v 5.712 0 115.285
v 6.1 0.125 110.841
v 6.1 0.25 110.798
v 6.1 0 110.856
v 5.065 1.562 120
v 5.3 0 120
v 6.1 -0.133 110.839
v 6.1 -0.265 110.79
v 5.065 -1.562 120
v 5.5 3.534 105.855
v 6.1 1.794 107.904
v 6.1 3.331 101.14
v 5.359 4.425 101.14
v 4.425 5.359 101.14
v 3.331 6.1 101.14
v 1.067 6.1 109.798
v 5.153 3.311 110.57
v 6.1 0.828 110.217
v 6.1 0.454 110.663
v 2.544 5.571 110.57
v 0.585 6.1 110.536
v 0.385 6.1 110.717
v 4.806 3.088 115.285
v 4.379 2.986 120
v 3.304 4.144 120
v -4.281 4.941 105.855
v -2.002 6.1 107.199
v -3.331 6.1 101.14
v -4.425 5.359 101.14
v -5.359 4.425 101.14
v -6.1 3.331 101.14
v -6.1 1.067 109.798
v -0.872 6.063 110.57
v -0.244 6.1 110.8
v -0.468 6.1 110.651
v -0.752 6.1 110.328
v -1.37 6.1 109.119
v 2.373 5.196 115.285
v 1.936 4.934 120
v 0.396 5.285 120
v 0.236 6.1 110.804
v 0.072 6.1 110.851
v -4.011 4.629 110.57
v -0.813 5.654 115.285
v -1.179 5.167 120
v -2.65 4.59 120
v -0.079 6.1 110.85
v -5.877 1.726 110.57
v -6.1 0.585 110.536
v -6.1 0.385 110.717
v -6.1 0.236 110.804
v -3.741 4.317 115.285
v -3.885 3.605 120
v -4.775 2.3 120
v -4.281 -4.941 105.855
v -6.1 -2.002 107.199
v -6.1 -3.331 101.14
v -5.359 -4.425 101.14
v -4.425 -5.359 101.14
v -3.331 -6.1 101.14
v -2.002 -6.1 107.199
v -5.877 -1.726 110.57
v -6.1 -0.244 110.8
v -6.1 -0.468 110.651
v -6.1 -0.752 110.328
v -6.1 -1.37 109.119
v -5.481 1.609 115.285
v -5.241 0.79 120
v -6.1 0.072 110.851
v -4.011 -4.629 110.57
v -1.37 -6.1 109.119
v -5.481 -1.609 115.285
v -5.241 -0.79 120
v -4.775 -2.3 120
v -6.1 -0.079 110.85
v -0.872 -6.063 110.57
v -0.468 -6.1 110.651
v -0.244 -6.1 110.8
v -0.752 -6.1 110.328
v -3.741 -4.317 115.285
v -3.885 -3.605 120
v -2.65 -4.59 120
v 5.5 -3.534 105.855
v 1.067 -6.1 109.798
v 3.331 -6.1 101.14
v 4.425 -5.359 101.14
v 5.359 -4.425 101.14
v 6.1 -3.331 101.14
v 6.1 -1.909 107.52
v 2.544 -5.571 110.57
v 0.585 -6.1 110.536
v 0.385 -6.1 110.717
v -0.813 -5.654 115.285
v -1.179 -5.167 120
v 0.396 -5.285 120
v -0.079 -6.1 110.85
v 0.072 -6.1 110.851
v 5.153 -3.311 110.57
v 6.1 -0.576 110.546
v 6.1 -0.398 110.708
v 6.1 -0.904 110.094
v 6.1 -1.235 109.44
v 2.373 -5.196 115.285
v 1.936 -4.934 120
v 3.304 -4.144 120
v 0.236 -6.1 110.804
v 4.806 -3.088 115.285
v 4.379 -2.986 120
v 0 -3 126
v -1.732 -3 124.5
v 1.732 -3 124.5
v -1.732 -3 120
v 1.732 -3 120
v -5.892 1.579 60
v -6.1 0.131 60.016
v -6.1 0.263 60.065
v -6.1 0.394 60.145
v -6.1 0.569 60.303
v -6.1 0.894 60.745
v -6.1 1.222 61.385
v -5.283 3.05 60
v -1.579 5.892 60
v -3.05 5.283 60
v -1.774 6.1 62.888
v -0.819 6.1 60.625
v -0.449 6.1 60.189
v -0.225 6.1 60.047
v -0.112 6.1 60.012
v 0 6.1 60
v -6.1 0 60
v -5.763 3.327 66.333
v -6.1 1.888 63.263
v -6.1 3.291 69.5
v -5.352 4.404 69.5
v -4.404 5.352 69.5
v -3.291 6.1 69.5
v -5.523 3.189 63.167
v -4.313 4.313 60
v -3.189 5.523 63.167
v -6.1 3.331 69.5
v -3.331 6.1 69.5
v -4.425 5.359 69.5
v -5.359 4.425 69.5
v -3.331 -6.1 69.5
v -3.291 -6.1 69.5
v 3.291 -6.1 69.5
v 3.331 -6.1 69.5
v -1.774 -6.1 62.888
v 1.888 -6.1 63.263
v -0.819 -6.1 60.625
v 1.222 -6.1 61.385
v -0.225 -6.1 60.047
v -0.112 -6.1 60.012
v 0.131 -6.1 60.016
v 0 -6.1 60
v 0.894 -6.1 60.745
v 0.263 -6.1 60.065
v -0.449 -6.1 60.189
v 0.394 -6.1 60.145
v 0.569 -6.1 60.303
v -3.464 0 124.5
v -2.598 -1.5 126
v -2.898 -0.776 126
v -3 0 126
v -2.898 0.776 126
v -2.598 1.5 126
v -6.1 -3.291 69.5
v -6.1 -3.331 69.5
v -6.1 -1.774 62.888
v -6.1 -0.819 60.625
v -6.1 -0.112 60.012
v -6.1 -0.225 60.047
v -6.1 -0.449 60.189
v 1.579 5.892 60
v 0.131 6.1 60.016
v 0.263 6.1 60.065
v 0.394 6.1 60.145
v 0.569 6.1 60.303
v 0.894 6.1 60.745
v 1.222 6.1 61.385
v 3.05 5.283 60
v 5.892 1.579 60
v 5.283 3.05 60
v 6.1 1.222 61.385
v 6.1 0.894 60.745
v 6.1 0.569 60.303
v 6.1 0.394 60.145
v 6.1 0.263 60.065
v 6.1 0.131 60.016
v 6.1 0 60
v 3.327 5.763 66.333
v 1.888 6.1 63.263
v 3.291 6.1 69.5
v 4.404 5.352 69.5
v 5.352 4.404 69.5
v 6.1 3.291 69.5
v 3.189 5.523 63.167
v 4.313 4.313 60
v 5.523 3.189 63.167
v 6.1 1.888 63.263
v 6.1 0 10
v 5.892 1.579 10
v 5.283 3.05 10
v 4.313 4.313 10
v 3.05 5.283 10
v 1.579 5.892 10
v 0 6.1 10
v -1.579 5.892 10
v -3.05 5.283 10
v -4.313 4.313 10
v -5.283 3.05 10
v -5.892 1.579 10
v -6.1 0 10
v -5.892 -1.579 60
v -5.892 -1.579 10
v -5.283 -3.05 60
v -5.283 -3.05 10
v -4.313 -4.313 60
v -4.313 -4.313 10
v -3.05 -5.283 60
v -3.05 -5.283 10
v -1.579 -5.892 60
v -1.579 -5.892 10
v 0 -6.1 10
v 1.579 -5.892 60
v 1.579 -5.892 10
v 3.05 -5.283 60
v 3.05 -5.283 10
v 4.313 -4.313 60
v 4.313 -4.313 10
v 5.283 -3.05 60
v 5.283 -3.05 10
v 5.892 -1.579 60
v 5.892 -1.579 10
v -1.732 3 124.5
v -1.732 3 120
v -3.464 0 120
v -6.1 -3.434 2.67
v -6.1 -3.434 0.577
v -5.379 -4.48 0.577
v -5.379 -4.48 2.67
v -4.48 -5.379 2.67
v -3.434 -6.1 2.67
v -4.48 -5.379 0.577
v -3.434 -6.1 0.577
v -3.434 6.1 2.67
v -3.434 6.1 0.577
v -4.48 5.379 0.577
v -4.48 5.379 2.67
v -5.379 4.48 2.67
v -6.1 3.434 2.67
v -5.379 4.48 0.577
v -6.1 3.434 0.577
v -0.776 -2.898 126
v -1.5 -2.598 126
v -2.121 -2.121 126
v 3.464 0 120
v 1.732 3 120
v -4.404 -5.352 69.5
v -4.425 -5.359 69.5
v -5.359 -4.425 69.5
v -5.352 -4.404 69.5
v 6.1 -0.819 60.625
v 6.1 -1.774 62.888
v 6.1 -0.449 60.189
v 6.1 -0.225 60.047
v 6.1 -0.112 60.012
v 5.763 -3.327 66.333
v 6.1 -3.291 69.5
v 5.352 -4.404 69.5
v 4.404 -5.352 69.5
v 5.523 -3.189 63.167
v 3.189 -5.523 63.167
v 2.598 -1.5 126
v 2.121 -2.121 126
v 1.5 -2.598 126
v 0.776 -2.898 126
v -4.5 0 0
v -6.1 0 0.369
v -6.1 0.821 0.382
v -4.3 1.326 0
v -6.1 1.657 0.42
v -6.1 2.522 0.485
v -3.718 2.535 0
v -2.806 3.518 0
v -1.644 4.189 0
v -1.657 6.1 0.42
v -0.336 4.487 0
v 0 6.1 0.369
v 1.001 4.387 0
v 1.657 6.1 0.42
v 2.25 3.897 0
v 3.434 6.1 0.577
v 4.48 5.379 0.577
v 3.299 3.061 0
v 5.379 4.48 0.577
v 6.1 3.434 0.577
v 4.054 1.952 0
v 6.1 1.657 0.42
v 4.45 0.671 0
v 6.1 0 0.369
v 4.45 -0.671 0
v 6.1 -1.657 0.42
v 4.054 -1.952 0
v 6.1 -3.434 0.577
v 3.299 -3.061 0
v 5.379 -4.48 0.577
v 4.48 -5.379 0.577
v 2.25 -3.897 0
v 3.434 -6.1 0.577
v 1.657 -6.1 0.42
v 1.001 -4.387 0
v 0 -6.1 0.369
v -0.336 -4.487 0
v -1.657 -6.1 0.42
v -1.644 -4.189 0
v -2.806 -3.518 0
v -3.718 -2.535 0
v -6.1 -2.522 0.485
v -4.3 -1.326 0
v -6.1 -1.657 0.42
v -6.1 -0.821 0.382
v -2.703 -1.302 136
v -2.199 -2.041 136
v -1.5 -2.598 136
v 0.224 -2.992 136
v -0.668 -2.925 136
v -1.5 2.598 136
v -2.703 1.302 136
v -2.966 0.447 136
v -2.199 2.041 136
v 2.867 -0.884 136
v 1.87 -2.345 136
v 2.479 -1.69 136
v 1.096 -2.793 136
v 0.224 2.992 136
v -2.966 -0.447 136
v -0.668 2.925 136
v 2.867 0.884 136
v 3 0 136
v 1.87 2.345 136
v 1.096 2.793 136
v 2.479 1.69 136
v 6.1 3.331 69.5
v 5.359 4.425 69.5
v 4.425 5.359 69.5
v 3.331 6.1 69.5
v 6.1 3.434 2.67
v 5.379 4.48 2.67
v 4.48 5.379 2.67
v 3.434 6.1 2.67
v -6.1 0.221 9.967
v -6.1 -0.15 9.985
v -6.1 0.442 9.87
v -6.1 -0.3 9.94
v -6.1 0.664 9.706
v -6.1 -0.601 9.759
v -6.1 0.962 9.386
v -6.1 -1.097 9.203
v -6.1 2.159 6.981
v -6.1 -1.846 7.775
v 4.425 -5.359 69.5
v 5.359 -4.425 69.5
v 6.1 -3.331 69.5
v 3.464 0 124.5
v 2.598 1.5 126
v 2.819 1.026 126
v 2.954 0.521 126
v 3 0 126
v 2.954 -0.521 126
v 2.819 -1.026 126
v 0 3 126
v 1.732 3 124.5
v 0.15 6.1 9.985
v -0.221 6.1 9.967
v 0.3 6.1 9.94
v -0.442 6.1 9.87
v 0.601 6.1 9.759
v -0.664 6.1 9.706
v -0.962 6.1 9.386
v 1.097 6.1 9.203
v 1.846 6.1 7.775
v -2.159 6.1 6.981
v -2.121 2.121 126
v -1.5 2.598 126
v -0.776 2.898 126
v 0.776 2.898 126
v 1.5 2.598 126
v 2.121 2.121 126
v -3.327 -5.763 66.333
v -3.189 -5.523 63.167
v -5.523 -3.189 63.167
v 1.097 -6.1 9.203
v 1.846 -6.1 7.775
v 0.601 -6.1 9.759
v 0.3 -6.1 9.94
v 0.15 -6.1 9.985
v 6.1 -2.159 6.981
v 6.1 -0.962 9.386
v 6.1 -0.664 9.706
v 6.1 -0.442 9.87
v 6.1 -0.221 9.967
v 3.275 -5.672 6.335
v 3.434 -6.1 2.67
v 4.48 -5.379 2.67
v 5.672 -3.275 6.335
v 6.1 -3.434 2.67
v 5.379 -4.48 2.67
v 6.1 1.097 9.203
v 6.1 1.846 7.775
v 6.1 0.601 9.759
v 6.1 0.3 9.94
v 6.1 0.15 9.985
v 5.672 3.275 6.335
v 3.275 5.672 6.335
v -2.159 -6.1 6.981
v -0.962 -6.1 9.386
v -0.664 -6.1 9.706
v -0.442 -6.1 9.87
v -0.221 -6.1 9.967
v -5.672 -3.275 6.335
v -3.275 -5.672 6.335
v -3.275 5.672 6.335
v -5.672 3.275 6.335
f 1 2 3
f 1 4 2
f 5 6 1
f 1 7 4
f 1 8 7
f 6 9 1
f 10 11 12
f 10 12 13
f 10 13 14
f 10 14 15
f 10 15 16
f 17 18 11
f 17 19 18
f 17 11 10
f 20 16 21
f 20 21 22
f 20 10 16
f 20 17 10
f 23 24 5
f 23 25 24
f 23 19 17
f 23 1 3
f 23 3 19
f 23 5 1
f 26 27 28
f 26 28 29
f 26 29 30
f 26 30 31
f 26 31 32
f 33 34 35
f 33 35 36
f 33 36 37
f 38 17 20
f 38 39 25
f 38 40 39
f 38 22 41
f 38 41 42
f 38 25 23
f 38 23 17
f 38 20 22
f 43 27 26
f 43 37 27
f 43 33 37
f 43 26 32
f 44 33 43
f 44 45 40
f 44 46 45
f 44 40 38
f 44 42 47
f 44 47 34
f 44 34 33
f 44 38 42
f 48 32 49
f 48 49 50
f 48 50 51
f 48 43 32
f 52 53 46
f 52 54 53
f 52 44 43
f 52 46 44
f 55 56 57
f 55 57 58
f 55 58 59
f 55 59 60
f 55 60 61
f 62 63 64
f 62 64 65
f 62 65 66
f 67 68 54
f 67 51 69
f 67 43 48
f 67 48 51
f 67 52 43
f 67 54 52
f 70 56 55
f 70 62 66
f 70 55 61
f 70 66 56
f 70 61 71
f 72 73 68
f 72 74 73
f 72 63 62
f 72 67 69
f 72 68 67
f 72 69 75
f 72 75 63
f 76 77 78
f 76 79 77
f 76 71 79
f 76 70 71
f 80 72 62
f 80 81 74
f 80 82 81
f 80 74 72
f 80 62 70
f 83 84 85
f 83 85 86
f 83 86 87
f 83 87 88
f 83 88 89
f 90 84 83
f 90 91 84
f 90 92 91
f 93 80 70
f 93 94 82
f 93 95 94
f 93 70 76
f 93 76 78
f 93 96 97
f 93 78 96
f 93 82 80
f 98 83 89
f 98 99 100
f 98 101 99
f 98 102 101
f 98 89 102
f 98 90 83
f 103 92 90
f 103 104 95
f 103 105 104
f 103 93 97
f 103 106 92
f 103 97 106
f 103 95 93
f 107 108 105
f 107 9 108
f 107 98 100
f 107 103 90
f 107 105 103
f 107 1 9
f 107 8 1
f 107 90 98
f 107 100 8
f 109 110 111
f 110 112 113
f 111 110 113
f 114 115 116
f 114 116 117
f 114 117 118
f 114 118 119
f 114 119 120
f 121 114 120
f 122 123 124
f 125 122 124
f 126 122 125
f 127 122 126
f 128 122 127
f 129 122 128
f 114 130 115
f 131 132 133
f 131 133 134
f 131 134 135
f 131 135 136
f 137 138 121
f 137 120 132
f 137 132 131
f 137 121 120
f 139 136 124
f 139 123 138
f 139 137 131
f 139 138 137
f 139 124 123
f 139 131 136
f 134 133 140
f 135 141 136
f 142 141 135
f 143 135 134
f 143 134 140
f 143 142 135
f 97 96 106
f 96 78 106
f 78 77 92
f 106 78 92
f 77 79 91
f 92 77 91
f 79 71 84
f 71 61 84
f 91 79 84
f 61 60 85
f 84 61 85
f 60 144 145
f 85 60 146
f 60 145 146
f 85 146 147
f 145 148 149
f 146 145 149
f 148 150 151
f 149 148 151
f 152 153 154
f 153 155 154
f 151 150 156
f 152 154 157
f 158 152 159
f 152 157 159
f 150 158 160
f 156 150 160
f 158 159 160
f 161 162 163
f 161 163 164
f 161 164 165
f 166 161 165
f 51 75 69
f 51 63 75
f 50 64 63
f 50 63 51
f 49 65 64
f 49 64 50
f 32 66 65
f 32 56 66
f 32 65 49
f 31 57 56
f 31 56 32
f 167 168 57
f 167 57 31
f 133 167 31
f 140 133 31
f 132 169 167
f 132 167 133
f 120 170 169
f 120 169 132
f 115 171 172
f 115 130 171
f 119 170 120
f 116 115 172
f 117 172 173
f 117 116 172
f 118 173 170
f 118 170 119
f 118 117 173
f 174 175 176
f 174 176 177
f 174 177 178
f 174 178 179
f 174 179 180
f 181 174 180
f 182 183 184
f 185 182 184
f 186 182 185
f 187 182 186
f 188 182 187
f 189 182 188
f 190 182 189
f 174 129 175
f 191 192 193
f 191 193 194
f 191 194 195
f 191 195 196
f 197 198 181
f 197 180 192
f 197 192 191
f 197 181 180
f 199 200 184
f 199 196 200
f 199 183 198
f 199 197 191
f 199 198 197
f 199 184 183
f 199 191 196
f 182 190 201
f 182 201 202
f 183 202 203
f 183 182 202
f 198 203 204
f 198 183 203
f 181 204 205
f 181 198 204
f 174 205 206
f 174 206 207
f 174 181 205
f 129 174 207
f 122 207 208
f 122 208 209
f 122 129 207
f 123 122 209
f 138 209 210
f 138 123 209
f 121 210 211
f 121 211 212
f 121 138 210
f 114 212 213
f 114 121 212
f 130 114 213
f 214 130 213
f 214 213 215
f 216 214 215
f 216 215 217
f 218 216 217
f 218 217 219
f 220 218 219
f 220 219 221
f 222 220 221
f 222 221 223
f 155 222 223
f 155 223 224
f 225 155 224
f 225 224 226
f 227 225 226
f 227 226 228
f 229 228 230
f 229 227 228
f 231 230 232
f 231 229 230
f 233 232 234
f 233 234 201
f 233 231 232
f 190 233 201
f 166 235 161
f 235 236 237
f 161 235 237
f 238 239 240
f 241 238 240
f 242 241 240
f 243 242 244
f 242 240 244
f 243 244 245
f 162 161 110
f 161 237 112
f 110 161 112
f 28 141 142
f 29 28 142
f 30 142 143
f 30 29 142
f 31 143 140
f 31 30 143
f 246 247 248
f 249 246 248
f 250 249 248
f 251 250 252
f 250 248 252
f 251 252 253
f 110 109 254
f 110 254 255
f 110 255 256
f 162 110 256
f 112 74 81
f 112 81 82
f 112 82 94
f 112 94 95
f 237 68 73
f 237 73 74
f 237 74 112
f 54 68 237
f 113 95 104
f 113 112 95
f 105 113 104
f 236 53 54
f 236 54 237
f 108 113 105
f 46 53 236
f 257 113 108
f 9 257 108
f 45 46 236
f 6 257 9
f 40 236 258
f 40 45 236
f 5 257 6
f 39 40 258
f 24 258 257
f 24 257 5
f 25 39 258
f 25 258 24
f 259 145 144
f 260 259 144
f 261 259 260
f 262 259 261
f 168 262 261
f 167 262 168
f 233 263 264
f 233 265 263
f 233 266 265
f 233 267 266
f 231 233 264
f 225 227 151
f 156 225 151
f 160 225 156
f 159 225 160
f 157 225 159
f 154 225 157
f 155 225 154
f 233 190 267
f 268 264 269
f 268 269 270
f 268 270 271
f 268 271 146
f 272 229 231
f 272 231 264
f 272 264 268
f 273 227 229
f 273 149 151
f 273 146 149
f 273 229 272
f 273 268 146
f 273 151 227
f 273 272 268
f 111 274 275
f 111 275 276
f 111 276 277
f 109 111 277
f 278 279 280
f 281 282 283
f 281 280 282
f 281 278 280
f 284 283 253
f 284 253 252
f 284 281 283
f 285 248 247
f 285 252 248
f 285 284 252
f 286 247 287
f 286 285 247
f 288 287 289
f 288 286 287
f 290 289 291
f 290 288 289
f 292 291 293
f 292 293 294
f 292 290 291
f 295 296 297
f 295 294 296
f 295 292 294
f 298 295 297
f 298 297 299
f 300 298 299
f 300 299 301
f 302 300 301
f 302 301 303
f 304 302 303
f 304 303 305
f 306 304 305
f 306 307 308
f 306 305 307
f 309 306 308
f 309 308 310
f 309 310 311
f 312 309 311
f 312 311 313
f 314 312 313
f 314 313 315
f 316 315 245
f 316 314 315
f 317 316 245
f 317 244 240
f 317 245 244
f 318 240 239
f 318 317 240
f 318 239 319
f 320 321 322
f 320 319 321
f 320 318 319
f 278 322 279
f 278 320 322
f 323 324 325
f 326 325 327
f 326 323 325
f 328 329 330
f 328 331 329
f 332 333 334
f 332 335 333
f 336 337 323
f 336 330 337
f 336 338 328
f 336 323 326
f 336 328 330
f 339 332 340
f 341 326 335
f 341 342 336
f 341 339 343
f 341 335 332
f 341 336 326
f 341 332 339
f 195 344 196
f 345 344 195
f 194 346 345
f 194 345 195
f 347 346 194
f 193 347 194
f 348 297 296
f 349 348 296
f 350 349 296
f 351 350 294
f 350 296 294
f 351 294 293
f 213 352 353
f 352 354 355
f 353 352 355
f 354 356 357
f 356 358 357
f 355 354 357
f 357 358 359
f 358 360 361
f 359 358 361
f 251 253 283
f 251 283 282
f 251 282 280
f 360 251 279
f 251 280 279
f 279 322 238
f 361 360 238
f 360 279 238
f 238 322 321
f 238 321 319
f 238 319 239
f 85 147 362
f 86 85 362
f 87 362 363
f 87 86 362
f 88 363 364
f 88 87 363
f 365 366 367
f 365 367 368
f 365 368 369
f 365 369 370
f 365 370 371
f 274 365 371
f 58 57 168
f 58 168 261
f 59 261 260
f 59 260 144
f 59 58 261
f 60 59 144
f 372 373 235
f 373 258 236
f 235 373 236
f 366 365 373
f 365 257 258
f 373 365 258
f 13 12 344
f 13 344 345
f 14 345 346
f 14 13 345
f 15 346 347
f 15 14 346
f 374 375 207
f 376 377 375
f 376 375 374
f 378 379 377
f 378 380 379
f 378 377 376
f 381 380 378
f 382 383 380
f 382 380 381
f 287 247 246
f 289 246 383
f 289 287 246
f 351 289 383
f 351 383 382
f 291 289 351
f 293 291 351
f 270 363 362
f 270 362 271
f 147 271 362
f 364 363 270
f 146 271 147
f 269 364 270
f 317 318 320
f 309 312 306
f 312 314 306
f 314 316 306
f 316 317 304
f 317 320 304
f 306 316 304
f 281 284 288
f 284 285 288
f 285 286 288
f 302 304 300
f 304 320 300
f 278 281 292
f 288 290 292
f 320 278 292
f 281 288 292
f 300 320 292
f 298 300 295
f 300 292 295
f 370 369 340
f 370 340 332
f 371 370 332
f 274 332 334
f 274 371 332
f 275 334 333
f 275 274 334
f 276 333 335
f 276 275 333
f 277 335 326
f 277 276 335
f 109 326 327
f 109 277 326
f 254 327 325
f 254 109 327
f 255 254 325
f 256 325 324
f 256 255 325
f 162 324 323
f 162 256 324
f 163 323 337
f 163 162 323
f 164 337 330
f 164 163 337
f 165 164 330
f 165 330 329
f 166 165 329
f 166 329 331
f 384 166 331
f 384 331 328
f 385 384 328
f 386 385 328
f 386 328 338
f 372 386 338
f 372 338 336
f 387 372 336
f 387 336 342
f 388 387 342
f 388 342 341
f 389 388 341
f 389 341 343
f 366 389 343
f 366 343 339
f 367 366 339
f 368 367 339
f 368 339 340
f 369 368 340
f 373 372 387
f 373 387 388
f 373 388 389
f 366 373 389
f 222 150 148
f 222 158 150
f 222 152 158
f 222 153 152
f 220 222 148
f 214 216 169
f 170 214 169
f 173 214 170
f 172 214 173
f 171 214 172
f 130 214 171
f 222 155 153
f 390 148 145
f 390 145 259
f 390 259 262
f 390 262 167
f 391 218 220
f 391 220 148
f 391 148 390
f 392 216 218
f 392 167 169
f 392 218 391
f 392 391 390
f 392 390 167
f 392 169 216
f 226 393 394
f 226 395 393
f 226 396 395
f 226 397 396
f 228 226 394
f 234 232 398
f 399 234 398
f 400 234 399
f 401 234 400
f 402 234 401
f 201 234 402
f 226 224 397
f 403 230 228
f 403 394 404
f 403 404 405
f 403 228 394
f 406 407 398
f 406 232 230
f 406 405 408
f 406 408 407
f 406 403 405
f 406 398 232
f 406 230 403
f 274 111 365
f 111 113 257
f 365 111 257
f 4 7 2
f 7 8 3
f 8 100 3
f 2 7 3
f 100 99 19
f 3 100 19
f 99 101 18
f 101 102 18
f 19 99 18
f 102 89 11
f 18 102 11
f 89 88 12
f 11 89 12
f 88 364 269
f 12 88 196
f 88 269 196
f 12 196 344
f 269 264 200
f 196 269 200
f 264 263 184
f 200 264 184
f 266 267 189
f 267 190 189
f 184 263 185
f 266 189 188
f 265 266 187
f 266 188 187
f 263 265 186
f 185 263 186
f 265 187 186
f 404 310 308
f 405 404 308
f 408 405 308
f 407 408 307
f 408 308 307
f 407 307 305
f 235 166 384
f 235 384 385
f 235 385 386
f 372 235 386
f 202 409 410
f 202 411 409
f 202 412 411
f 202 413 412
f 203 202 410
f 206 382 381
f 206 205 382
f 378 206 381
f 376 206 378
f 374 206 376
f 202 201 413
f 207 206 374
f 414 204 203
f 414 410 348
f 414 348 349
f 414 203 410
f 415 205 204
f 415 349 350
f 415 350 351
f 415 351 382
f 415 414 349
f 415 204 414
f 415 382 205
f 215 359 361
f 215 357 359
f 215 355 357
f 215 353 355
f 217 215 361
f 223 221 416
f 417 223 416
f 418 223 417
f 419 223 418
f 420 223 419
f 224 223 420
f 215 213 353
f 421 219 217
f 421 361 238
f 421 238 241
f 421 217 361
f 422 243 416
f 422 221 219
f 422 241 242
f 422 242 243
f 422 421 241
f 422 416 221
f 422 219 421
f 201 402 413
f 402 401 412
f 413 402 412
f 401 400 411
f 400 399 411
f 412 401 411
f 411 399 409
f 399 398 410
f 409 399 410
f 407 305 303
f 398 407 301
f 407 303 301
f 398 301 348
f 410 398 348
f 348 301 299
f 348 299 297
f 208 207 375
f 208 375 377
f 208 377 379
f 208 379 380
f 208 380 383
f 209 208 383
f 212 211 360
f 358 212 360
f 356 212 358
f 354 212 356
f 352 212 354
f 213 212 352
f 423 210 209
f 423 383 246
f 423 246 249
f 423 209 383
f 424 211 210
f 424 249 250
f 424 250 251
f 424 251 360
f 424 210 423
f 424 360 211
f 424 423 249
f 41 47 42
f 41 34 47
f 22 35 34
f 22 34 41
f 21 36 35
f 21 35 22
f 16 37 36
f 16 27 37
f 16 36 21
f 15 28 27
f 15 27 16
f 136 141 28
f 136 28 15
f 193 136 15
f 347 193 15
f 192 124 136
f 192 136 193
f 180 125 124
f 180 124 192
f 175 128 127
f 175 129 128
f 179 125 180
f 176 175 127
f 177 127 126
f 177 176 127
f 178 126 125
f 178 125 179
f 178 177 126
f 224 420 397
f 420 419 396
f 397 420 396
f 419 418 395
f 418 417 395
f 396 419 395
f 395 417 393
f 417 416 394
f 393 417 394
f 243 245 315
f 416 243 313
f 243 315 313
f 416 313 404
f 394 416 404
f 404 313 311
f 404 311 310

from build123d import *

# Parameters (mm, degrees)
SKETCH1_W           = 12.2
SKETCH1_H           = 12.2
BOSS_EXTRUDE1_DEPTH = 120
SKETCH2_OUTSIDE_W   = 38.446
SKETCH2_OUTSIDE_H   = 38.446
SKETCH2_OUTSIDE_R   = 6.95
CUT_EXTRUDE1_DEPTH  = 121.309683733
SKETCH3_OUTSIDE_W   = 41.946
SKETCH3_OUTSIDE_H   = 41.946
SKETCH3_OUTSIDE_R   = 5.3
CUT_EXTRUDE2_DEPTH  = 20
CUT_EXTRUDE2_DRAFT  = -5
CUT_EXTRUDE3_START  = -60
SKETCH4_OUTSIDE_W   = 38.446
SKETCH4_OUTSIDE_H   = 38.446
SKETCH4_OUTSIDE_R   = 6.1
CUT_EXTRUDE3_DEPTH  = 50
SKETCH5_OUTSIDE_W   = 40.11
SKETCH5_OUTSIDE_H   = 40.11
SKETCH5_OUTSIDE_R   = 6.1
CUT_EXTRUDE4_DEPTH  = 9.5
CUT_EXTRUDE4_DRAFT  = -5
BOSS_EXTRUDE2_DEPTH = 3.5
SKETCH6_OUTSIDE_W   = 40.78
SKETCH6_OUTSIDE_H   = 40.78
SKETCH6_OUTSIDE_R   = 6.1
CUT_EXTRUDE6_DEPTH  = 9.5
CUT_EXTRUDE6_DRAFT  = -7
SKETCH8_OUTSIDE_W   = 68.768
SKETCH8_OUTSIDE_H   = 68.768
SKETCH8_OUTSIDE_R   = 4.5
CUT_EXTRUDE7_DEPTH  = 3.5
CUT_EXTRUDE7_DRAFT  = -77
BOSS_EXTRUDE3_DEPTH = 16


with BuildPart() as part:
    # Sketch1 → Boss-Extrude1 (new body)
    with BuildSketch(Plane.XY):
        Rectangle(SKETCH1_W, SKETCH1_H)
    extrude(amount=BOSS_EXTRUDE1_DEPTH)

    # Sketch2 outside → Cut-Extrude1 (cut, through all)
    with BuildSketch(Plane.XY.offset(120)):
        Rectangle(SKETCH2_OUTSIDE_W, SKETCH2_OUTSIDE_H)
        Circle(SKETCH2_OUTSIDE_R, mode=Mode.SUBTRACT)
    extrude(amount=-CUT_EXTRUDE1_DEPTH, mode=Mode.SUBTRACT)


with BuildPart() as cut_extrude2_tool:
    # Sketch3 outside → Cut-Extrude2 (with draft: the straight prism first)
    with BuildSketch(Plane.XY.offset(120)):
        Rectangle(SKETCH3_OUTSIDE_W, SKETCH3_OUTSIDE_H)
        Circle(SKETCH3_OUTSIDE_R, mode=Mode.SUBTRACT)
    extrude(amount=-CUT_EXTRUDE2_DEPTH)
    # Cut-Extrude2: the draft: its side faces are tilted about the plane it starts from
    cut_extrude2_sides = [cut_extrude2_tool.faces().sort_by_distance(p)[0] for p in [
        (0, -20.973, 110),
        (20.973, 0, 110),
        (0, 20.973, 110),
        (-20.973, 0, 110),
        (-5.3, 0, 110),
    ]]
    draft(cut_extrude2_sides, Plane.XY.offset(120), CUT_EXTRUDE2_DRAFT)


with BuildPart() as part_1:
    add(part.part)

    # Cut-Extrude2: cut by cut_extrude2_tool
    add(cut_extrude2_tool.part, mode=Mode.SUBTRACT)

    # Sketch4 outside → Cut-Extrude3 (cut)
    with BuildSketch(Plane.XY.offset(120).offset(CUT_EXTRUDE3_START)):
        Rectangle(SKETCH4_OUTSIDE_W, SKETCH4_OUTSIDE_H)
        Circle(SKETCH4_OUTSIDE_R, mode=Mode.SUBTRACT)
    extrude(amount=-CUT_EXTRUDE3_DEPTH, mode=Mode.SUBTRACT)


with BuildPart() as cut_extrude4_tool:
    # Sketch5 outside → Cut-Extrude4 (with draft: the straight prism first)
    with BuildSketch(Plane(origin=(0, 0, 60), x_dir=(-1, 0, 0), z_dir=(0, 0, -1))):
        Rectangle(SKETCH5_OUTSIDE_W, SKETCH5_OUTSIDE_H)
        with Locations(Location((0, 0, 0), (0, 0, 180))):
            Circle(SKETCH5_OUTSIDE_R, mode=Mode.SUBTRACT)
    extrude(amount=-CUT_EXTRUDE4_DEPTH)
    # Cut-Extrude4: the draft: its side faces are tilted about the plane it starts from
    cut_extrude4_sides = [cut_extrude4_tool.faces().sort_by_distance(p)[0] for p in [
        (0, -20.055, 64.75),
        (-20.055, 0, 64.75),
        (0, 20.055, 64.75),
        (20.055, 0, 64.75),
        (-6.1, 0, 64.75),
    ]]
    draft(cut_extrude4_sides, Plane(origin=(0, 0, 60), x_dir=(-1, 0, 0), z_dir=(0, 0, -1)), CUT_EXTRUDE4_DRAFT)


with BuildPart() as part_2:
    add(part_1.part)

    # Cut-Extrude4: cut by cut_extrude4_tool
    add(cut_extrude4_tool.part, mode=Mode.SUBTRACT)

    # Sketch7 → Boss-Extrude2 (add)
    with BuildSketch(Plane(origin=(0, 0, 0), x_dir=(-1, 0, 0), z_dir=(0, 0, -1))):
        with BuildLine():
            Line((3.433656943, -6.1), (-3.433656943, -6.1))
            ThreePointArc((-3.433656943, -6.1), (-4.949747468, -4.949747468), (-6.1, -3.433656943))
            Line((-6.1, -3.433656943), (-6.1, 3.433656943))
            ThreePointArc((-6.1, 3.433656943), (-4.949747468, 4.949747468), (-3.433656943, 6.1))
            Line((-3.433656943, 6.1), (3.433656943, 6.1))
            ThreePointArc((3.433656943, 6.1), (4.949747468, 4.949747468), (6.1, 3.433656943))
            Line((6.1, 3.433656943), (6.1, -3.433656943))
            ThreePointArc((6.1, -3.433656943), (4.949747468, -4.949747468), (3.433656943, -6.1))
        make_face()
    extrude(amount=-BOSS_EXTRUDE2_DEPTH)


with BuildPart() as cut_extrude6_tool:
    # Sketch6 outside → Cut-Extrude6 (with draft: the straight prism first)
    with BuildSketch(Plane.XY.offset(10)):
        Rectangle(SKETCH6_OUTSIDE_W, SKETCH6_OUTSIDE_H)
        Circle(SKETCH6_OUTSIDE_R, mode=Mode.SUBTRACT)
    extrude(amount=-CUT_EXTRUDE6_DEPTH)
    # Cut-Extrude6: the draft: its side faces are tilted about the plane it starts from
    cut_extrude6_sides = [cut_extrude6_tool.faces().sort_by_distance(p)[0] for p in [
        (0, -20.39, 5.25),
        (20.39, 0, 5.25),
        (0, 20.39, 5.25),
        (-20.39, 0, 5.25),
        (-6.1, 0, 5.25),
    ]]
    draft(cut_extrude6_sides, Plane.XY.offset(10), CUT_EXTRUDE6_DRAFT)


with BuildPart() as part_3:
    add(part_2.part)

    # Cut-Extrude6: cut by cut_extrude6_tool
    add(cut_extrude6_tool.part, mode=Mode.SUBTRACT)


with BuildPart() as cut_extrude7_tool:
    # Sketch8 outside → Cut-Extrude7 (with draft: the straight prism first)
    with BuildSketch(Plane(origin=(0, 0, 0), x_dir=(-1, 0, 0), z_dir=(0, 0, -1))):
        Rectangle(SKETCH8_OUTSIDE_W, SKETCH8_OUTSIDE_H)
        Circle(SKETCH8_OUTSIDE_R, mode=Mode.SUBTRACT)
    extrude(amount=-CUT_EXTRUDE7_DEPTH)
    # Cut-Extrude7: the draft: its side faces are tilted about the plane it starts from
    cut_extrude7_sides = [cut_extrude7_tool.faces().sort_by_distance(p)[0] for p in [
        (0, -34.384, 1.75),
        (-34.384, 0, 1.75),
        (0, 34.384, 1.75),
        (34.384, 0, 1.75),
        (4.5, 0, 1.75),
    ]]
    draft(cut_extrude7_sides, Plane(origin=(0, 0, 0), x_dir=(-1, 0, 0), z_dir=(0, 0, -1)), CUT_EXTRUDE7_DRAFT)


with BuildPart() as part_4:
    add(part_3.part)

    # Cut-Extrude7: cut by cut_extrude7_tool
    add(cut_extrude7_tool.part, mode=Mode.SUBTRACT)

    # Sketch9 → Boss-Extrude3 (add)
    with BuildSketch(Plane.XY.offset(120)):
        Polygon((1.732050808, 3), (-1.732050808, 3), (-3.464101615, 0), (-1.732050808, -3), (1.732050808, -3), (3.464101615, 0), align=None)
    extrude(amount=BOSS_EXTRUDE3_DEPTH)

    # Sketch10 → Cut-Revolve1 (revolve, cut)
    with BuildSketch(Plane(origin=(0, 0, 0), x_dir=(1, 0, 0), z_dir=(0, 1, 0))):
        with BuildLine():
            Line((3, -136), (3, -126))
            ThreePointArc((3, -126), (3.1186767, -125.214921929), (3.464101615, -124.5))
            Line((3.464101615, -124.5), (3.464101615, -136))
            Line((3.464101615, -136), (3, -136))
        make_face()
    revolve(axis=Axis((0, 0, 120), (0, 0, -1)), mode=Mode.SUBTRACT)


solid = part_4.part
